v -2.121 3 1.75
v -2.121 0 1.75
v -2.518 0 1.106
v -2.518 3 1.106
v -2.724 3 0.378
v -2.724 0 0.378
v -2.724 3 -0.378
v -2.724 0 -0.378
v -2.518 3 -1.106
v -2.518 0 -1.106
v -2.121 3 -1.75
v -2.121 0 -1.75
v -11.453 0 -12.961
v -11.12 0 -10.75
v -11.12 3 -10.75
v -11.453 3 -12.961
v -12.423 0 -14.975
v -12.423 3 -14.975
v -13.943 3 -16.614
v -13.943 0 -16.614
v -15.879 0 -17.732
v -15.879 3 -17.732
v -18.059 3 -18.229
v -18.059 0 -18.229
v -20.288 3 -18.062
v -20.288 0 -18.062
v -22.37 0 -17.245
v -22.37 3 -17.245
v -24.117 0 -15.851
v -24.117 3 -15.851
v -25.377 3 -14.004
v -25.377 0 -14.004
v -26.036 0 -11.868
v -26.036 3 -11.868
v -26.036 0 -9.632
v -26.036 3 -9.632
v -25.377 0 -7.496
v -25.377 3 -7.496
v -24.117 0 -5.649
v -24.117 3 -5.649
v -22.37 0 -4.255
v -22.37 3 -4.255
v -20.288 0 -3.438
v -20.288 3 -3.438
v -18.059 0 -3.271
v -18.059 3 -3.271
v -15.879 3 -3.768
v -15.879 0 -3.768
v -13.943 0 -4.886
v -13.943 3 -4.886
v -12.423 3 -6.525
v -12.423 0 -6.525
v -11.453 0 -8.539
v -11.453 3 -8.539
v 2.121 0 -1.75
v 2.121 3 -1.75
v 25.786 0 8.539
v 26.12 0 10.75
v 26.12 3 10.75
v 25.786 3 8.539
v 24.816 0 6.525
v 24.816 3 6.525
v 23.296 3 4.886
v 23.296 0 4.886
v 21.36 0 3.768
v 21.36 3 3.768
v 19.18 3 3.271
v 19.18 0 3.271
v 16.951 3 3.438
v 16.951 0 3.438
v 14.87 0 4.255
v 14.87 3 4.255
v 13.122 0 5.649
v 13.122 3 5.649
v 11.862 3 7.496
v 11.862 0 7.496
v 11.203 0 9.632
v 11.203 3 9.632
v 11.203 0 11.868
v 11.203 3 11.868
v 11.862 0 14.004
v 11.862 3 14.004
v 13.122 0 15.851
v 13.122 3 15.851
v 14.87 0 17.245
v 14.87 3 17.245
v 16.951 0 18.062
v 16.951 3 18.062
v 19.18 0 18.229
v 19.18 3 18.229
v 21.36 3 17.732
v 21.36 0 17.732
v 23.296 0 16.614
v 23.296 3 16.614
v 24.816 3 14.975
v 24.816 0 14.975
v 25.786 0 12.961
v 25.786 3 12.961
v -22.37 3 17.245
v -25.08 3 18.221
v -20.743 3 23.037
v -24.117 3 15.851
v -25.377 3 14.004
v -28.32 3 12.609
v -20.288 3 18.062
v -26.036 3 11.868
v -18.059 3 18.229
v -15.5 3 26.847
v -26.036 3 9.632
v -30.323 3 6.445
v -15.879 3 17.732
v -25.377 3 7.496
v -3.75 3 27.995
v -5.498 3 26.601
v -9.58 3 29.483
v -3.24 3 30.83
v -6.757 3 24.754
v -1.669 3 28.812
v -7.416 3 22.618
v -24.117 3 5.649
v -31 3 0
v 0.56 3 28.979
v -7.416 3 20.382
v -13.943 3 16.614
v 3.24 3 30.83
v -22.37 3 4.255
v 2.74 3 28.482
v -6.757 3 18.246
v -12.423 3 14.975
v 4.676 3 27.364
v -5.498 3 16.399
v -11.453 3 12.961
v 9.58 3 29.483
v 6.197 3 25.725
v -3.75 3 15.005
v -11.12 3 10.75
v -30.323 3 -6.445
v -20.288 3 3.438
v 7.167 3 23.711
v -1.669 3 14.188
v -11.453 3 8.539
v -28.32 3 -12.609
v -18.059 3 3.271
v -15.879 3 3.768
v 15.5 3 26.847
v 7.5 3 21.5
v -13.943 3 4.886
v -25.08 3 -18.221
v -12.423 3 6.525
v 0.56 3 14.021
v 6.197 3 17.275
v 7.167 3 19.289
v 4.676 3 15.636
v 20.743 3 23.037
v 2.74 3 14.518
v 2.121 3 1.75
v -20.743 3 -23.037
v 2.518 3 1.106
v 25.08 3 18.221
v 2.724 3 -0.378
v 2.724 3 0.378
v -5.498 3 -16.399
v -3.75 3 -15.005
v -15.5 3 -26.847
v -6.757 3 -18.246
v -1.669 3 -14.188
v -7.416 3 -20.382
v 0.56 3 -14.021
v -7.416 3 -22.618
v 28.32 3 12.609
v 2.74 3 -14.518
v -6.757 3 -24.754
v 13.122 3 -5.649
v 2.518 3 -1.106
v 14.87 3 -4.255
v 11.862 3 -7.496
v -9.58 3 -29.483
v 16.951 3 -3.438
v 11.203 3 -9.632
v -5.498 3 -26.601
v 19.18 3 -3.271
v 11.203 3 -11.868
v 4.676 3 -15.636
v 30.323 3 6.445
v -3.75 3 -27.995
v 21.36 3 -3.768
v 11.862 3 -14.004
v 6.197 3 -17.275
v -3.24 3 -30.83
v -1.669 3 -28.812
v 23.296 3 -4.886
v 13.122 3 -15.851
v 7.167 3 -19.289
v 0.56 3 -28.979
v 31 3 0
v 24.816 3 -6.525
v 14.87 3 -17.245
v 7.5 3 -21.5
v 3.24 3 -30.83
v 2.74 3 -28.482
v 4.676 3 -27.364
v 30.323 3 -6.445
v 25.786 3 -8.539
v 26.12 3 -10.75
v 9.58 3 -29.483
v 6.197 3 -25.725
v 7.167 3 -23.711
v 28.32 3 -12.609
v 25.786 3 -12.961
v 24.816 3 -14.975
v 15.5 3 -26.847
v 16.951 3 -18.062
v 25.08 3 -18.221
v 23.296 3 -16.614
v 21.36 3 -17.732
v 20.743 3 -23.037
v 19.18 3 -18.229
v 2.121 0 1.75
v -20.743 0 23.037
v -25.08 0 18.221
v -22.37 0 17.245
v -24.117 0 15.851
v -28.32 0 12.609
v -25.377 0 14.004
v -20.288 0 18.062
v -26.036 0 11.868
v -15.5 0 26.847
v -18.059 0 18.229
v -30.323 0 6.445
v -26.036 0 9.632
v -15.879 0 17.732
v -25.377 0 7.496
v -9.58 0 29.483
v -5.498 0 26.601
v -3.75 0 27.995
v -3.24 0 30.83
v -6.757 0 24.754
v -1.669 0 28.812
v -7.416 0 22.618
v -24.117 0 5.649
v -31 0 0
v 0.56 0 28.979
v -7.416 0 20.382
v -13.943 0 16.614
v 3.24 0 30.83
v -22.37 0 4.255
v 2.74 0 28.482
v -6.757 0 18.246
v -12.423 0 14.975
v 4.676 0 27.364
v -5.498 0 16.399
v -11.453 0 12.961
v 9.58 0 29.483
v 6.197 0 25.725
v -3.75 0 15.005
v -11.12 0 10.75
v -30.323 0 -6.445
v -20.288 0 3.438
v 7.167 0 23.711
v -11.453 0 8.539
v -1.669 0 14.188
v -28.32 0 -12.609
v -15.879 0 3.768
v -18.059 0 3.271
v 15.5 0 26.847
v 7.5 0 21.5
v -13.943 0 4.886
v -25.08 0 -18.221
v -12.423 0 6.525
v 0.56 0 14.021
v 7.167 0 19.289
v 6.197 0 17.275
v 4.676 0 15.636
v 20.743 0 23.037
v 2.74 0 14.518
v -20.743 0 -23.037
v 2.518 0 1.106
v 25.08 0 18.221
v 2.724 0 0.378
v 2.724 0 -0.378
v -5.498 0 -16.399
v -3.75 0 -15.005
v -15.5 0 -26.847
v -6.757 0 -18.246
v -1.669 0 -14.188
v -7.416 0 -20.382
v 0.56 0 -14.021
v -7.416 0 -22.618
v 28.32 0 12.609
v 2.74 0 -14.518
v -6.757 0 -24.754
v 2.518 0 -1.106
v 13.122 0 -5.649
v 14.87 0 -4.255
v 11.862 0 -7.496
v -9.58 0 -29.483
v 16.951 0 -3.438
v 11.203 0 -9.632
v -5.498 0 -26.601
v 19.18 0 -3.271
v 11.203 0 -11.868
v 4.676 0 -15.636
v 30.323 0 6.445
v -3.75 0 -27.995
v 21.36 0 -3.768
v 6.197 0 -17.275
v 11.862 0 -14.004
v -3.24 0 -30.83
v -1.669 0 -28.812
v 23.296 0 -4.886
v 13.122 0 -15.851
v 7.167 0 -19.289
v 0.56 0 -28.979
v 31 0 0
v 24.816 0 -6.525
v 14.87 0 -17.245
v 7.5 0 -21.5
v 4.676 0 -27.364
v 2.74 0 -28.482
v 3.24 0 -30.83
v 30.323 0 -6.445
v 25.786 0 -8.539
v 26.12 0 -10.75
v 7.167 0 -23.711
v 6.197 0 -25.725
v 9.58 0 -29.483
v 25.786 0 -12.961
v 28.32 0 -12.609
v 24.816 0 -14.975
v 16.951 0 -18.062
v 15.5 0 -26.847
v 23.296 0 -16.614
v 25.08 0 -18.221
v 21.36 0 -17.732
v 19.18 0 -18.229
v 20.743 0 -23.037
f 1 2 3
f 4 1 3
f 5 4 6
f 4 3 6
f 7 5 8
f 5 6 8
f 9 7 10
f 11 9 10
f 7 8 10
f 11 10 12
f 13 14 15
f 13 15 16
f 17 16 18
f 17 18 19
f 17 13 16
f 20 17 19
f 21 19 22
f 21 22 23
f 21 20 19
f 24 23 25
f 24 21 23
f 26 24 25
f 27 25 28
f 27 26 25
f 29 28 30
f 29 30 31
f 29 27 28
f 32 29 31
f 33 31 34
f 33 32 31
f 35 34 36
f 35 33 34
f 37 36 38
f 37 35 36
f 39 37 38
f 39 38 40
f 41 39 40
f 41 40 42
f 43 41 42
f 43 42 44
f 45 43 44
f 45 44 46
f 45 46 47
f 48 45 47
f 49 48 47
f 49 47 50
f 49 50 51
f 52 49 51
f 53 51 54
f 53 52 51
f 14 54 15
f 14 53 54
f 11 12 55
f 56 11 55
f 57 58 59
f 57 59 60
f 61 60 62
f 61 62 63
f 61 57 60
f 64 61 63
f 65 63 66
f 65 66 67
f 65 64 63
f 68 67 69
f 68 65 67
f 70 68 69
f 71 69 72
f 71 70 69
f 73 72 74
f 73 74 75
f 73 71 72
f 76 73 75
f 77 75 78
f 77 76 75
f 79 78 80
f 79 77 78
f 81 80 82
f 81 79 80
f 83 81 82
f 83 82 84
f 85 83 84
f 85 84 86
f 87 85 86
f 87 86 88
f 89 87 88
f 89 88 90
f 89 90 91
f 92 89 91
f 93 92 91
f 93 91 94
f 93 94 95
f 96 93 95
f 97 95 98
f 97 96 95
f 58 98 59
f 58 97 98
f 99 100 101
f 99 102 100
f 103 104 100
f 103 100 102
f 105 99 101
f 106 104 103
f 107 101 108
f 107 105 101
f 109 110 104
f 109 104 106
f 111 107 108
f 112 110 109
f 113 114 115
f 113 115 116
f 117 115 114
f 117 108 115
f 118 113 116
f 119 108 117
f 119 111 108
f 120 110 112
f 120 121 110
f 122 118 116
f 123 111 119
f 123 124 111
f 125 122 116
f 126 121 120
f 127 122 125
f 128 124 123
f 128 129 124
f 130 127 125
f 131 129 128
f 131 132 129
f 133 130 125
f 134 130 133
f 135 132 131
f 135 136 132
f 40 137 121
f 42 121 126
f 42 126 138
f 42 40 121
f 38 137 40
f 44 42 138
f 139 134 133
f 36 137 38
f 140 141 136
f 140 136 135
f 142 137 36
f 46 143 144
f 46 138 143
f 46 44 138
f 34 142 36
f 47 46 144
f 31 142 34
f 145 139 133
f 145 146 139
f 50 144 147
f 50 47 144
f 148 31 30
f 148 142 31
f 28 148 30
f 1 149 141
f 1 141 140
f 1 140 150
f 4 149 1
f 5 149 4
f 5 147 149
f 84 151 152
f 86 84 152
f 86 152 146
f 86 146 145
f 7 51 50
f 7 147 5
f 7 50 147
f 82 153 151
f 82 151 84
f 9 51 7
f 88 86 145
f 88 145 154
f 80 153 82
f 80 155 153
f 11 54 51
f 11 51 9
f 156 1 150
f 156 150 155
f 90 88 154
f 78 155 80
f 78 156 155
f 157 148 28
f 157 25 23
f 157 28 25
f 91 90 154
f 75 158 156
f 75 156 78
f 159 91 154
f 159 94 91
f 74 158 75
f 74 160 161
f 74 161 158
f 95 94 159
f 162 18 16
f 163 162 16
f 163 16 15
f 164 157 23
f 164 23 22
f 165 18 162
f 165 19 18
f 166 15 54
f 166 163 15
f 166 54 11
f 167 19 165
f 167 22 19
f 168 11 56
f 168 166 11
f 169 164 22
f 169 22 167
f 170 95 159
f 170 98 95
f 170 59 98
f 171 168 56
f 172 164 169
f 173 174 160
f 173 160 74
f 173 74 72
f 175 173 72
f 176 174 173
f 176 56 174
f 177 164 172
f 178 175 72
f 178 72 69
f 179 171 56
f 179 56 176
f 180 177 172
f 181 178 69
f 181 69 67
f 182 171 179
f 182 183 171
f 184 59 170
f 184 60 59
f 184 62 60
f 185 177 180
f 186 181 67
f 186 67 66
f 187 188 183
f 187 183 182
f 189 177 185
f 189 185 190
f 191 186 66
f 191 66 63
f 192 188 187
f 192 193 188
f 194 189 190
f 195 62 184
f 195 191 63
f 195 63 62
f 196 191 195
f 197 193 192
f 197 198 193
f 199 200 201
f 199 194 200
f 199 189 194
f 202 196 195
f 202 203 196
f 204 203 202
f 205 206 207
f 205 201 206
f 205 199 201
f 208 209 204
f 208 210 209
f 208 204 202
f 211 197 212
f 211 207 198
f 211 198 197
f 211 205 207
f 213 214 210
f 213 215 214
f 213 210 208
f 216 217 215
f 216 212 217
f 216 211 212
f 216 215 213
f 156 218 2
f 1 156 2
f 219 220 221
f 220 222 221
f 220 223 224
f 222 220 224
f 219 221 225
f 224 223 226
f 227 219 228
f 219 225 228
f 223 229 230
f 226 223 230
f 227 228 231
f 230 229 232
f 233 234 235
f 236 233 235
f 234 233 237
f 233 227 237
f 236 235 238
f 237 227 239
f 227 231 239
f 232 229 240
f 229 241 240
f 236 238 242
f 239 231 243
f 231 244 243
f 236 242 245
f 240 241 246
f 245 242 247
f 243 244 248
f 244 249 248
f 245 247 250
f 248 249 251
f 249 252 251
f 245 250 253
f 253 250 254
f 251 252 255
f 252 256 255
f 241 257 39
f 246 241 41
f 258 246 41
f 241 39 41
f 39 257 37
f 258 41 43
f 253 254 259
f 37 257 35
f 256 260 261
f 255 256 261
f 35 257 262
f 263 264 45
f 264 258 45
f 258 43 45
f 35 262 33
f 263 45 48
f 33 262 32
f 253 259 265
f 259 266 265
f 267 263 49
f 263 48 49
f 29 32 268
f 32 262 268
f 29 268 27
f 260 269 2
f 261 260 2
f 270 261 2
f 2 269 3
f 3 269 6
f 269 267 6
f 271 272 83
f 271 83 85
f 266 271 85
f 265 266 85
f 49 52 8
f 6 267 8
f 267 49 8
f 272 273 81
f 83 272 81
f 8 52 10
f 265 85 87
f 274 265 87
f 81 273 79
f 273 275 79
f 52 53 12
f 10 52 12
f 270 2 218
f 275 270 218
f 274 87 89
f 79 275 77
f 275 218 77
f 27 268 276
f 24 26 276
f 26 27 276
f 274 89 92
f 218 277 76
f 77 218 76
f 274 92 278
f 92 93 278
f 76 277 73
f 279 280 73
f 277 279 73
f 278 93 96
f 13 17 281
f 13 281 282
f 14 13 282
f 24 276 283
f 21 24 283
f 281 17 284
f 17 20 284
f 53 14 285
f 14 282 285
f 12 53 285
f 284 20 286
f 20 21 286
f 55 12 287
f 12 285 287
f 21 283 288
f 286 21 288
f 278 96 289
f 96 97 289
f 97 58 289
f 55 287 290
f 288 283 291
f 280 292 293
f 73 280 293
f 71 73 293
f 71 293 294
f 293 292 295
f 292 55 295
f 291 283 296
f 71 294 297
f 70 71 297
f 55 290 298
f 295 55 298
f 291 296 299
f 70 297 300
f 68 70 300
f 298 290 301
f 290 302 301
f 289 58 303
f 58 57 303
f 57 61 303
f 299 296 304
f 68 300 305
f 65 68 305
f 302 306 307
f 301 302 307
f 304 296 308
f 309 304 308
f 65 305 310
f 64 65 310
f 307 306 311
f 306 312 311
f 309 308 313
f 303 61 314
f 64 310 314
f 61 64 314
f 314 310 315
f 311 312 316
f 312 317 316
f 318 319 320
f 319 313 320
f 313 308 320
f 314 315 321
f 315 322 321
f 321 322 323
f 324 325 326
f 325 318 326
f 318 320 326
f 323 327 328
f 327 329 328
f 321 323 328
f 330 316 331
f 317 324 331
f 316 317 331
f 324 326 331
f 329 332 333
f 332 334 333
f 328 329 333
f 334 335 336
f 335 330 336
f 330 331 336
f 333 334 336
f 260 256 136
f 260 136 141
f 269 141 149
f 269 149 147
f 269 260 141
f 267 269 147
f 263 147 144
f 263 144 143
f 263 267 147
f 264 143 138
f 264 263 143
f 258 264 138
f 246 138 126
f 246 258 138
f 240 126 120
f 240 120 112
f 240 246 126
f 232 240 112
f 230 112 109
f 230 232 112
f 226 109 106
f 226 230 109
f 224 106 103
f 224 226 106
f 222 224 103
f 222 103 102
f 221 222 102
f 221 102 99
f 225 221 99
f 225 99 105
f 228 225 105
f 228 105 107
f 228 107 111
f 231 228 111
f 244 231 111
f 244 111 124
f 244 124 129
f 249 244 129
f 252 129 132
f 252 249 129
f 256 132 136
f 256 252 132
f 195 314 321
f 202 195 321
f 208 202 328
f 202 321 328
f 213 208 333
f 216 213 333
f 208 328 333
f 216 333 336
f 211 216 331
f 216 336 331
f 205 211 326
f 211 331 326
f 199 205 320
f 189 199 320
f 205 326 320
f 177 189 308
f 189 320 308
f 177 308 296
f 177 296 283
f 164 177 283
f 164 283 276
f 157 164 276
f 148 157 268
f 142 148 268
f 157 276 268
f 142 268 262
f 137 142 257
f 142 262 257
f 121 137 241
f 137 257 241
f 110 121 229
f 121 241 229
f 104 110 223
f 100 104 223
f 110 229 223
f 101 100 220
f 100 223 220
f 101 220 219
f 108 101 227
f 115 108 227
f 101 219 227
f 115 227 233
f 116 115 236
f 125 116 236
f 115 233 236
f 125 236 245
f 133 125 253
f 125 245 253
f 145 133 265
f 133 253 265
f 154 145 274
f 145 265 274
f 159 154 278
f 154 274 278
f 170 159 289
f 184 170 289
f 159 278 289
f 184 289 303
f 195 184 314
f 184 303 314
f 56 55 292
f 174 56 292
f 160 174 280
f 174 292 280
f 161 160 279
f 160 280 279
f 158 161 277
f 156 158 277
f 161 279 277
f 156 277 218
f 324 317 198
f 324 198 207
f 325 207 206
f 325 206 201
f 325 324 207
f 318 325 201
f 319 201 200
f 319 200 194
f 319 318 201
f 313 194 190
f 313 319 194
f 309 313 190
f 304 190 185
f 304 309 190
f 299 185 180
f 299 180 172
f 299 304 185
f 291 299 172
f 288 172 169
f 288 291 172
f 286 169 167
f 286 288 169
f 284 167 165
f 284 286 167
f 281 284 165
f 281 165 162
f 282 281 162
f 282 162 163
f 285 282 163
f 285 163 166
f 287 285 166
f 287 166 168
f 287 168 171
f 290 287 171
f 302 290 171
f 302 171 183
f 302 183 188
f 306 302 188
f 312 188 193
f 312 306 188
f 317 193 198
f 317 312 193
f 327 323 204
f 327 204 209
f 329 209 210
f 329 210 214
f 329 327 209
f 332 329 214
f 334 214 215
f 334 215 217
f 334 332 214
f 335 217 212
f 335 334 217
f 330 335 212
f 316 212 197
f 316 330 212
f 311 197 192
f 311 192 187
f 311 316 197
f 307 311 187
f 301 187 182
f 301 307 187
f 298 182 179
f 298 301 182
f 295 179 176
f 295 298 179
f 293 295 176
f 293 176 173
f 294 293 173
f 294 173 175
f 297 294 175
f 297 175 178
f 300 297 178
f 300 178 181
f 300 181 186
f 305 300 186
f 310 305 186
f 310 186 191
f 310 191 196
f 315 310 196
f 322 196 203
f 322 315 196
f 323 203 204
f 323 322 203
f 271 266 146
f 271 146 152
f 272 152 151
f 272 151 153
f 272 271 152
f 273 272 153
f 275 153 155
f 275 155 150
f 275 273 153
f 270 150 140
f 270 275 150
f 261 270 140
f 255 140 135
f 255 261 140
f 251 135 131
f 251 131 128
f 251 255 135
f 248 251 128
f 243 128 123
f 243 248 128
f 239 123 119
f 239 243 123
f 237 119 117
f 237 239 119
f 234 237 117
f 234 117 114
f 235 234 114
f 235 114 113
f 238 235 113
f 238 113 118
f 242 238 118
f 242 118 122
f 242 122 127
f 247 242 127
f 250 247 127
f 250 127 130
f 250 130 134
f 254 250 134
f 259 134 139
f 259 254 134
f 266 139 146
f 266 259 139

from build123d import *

# Parameters (mm, degrees)
SKETCH2_R           = 31
SKETCH2_R_2         = 7.5
BOSS_EXTRUDE1_DEPTH = 3


with BuildPart() as part:
    # Sketch2 → Boss-Extrude1 (new body)
    with BuildSketch(Plane(origin=(0, 0, 0), x_dir=(1, 0, 0), z_dir=(0, 1, 0))):
        Circle(SKETCH2_R)
        with Locations((0, 21.5)):
            Circle(SKETCH2_R_2, mode=Mode.SUBTRACT)
        with Locations((18.619546181, 10.75)):
            Circle(SKETCH2_R_2, mode=Mode.SUBTRACT)
        with Locations((18.619546181, -10.75)):
            Circle(SKETCH2_R_2, mode=Mode.SUBTRACT)
        with Locations((0, -21.5)):
            Circle(SKETCH2_R_2, mode=Mode.SUBTRACT)
        with Locations((-18.619546181, -10.75)):
            Circle(SKETCH2_R_2, mode=Mode.SUBTRACT)
        with Locations((-18.619546181, 10.75)):
            Circle(SKETCH2_R_2, mode=Mode.SUBTRACT)
        with BuildLine():
            Line((-2.121320344, 1.75), (2.121320344, 1.75))
            ThreePointArc((2.121320344, 1.75), (2.75, 0), (2.121320344, -1.75))
            Line((2.121320344, -1.75), (-2.121320344, -1.75))
            ThreePointArc((-2.121320344, -1.75), (-2.75, 0), (-2.121320344, 1.75))
        make_face(mode=Mode.SUBTRACT)
    extrude(amount=BOSS_EXTRUDE1_DEPTH)


solid = part.part
